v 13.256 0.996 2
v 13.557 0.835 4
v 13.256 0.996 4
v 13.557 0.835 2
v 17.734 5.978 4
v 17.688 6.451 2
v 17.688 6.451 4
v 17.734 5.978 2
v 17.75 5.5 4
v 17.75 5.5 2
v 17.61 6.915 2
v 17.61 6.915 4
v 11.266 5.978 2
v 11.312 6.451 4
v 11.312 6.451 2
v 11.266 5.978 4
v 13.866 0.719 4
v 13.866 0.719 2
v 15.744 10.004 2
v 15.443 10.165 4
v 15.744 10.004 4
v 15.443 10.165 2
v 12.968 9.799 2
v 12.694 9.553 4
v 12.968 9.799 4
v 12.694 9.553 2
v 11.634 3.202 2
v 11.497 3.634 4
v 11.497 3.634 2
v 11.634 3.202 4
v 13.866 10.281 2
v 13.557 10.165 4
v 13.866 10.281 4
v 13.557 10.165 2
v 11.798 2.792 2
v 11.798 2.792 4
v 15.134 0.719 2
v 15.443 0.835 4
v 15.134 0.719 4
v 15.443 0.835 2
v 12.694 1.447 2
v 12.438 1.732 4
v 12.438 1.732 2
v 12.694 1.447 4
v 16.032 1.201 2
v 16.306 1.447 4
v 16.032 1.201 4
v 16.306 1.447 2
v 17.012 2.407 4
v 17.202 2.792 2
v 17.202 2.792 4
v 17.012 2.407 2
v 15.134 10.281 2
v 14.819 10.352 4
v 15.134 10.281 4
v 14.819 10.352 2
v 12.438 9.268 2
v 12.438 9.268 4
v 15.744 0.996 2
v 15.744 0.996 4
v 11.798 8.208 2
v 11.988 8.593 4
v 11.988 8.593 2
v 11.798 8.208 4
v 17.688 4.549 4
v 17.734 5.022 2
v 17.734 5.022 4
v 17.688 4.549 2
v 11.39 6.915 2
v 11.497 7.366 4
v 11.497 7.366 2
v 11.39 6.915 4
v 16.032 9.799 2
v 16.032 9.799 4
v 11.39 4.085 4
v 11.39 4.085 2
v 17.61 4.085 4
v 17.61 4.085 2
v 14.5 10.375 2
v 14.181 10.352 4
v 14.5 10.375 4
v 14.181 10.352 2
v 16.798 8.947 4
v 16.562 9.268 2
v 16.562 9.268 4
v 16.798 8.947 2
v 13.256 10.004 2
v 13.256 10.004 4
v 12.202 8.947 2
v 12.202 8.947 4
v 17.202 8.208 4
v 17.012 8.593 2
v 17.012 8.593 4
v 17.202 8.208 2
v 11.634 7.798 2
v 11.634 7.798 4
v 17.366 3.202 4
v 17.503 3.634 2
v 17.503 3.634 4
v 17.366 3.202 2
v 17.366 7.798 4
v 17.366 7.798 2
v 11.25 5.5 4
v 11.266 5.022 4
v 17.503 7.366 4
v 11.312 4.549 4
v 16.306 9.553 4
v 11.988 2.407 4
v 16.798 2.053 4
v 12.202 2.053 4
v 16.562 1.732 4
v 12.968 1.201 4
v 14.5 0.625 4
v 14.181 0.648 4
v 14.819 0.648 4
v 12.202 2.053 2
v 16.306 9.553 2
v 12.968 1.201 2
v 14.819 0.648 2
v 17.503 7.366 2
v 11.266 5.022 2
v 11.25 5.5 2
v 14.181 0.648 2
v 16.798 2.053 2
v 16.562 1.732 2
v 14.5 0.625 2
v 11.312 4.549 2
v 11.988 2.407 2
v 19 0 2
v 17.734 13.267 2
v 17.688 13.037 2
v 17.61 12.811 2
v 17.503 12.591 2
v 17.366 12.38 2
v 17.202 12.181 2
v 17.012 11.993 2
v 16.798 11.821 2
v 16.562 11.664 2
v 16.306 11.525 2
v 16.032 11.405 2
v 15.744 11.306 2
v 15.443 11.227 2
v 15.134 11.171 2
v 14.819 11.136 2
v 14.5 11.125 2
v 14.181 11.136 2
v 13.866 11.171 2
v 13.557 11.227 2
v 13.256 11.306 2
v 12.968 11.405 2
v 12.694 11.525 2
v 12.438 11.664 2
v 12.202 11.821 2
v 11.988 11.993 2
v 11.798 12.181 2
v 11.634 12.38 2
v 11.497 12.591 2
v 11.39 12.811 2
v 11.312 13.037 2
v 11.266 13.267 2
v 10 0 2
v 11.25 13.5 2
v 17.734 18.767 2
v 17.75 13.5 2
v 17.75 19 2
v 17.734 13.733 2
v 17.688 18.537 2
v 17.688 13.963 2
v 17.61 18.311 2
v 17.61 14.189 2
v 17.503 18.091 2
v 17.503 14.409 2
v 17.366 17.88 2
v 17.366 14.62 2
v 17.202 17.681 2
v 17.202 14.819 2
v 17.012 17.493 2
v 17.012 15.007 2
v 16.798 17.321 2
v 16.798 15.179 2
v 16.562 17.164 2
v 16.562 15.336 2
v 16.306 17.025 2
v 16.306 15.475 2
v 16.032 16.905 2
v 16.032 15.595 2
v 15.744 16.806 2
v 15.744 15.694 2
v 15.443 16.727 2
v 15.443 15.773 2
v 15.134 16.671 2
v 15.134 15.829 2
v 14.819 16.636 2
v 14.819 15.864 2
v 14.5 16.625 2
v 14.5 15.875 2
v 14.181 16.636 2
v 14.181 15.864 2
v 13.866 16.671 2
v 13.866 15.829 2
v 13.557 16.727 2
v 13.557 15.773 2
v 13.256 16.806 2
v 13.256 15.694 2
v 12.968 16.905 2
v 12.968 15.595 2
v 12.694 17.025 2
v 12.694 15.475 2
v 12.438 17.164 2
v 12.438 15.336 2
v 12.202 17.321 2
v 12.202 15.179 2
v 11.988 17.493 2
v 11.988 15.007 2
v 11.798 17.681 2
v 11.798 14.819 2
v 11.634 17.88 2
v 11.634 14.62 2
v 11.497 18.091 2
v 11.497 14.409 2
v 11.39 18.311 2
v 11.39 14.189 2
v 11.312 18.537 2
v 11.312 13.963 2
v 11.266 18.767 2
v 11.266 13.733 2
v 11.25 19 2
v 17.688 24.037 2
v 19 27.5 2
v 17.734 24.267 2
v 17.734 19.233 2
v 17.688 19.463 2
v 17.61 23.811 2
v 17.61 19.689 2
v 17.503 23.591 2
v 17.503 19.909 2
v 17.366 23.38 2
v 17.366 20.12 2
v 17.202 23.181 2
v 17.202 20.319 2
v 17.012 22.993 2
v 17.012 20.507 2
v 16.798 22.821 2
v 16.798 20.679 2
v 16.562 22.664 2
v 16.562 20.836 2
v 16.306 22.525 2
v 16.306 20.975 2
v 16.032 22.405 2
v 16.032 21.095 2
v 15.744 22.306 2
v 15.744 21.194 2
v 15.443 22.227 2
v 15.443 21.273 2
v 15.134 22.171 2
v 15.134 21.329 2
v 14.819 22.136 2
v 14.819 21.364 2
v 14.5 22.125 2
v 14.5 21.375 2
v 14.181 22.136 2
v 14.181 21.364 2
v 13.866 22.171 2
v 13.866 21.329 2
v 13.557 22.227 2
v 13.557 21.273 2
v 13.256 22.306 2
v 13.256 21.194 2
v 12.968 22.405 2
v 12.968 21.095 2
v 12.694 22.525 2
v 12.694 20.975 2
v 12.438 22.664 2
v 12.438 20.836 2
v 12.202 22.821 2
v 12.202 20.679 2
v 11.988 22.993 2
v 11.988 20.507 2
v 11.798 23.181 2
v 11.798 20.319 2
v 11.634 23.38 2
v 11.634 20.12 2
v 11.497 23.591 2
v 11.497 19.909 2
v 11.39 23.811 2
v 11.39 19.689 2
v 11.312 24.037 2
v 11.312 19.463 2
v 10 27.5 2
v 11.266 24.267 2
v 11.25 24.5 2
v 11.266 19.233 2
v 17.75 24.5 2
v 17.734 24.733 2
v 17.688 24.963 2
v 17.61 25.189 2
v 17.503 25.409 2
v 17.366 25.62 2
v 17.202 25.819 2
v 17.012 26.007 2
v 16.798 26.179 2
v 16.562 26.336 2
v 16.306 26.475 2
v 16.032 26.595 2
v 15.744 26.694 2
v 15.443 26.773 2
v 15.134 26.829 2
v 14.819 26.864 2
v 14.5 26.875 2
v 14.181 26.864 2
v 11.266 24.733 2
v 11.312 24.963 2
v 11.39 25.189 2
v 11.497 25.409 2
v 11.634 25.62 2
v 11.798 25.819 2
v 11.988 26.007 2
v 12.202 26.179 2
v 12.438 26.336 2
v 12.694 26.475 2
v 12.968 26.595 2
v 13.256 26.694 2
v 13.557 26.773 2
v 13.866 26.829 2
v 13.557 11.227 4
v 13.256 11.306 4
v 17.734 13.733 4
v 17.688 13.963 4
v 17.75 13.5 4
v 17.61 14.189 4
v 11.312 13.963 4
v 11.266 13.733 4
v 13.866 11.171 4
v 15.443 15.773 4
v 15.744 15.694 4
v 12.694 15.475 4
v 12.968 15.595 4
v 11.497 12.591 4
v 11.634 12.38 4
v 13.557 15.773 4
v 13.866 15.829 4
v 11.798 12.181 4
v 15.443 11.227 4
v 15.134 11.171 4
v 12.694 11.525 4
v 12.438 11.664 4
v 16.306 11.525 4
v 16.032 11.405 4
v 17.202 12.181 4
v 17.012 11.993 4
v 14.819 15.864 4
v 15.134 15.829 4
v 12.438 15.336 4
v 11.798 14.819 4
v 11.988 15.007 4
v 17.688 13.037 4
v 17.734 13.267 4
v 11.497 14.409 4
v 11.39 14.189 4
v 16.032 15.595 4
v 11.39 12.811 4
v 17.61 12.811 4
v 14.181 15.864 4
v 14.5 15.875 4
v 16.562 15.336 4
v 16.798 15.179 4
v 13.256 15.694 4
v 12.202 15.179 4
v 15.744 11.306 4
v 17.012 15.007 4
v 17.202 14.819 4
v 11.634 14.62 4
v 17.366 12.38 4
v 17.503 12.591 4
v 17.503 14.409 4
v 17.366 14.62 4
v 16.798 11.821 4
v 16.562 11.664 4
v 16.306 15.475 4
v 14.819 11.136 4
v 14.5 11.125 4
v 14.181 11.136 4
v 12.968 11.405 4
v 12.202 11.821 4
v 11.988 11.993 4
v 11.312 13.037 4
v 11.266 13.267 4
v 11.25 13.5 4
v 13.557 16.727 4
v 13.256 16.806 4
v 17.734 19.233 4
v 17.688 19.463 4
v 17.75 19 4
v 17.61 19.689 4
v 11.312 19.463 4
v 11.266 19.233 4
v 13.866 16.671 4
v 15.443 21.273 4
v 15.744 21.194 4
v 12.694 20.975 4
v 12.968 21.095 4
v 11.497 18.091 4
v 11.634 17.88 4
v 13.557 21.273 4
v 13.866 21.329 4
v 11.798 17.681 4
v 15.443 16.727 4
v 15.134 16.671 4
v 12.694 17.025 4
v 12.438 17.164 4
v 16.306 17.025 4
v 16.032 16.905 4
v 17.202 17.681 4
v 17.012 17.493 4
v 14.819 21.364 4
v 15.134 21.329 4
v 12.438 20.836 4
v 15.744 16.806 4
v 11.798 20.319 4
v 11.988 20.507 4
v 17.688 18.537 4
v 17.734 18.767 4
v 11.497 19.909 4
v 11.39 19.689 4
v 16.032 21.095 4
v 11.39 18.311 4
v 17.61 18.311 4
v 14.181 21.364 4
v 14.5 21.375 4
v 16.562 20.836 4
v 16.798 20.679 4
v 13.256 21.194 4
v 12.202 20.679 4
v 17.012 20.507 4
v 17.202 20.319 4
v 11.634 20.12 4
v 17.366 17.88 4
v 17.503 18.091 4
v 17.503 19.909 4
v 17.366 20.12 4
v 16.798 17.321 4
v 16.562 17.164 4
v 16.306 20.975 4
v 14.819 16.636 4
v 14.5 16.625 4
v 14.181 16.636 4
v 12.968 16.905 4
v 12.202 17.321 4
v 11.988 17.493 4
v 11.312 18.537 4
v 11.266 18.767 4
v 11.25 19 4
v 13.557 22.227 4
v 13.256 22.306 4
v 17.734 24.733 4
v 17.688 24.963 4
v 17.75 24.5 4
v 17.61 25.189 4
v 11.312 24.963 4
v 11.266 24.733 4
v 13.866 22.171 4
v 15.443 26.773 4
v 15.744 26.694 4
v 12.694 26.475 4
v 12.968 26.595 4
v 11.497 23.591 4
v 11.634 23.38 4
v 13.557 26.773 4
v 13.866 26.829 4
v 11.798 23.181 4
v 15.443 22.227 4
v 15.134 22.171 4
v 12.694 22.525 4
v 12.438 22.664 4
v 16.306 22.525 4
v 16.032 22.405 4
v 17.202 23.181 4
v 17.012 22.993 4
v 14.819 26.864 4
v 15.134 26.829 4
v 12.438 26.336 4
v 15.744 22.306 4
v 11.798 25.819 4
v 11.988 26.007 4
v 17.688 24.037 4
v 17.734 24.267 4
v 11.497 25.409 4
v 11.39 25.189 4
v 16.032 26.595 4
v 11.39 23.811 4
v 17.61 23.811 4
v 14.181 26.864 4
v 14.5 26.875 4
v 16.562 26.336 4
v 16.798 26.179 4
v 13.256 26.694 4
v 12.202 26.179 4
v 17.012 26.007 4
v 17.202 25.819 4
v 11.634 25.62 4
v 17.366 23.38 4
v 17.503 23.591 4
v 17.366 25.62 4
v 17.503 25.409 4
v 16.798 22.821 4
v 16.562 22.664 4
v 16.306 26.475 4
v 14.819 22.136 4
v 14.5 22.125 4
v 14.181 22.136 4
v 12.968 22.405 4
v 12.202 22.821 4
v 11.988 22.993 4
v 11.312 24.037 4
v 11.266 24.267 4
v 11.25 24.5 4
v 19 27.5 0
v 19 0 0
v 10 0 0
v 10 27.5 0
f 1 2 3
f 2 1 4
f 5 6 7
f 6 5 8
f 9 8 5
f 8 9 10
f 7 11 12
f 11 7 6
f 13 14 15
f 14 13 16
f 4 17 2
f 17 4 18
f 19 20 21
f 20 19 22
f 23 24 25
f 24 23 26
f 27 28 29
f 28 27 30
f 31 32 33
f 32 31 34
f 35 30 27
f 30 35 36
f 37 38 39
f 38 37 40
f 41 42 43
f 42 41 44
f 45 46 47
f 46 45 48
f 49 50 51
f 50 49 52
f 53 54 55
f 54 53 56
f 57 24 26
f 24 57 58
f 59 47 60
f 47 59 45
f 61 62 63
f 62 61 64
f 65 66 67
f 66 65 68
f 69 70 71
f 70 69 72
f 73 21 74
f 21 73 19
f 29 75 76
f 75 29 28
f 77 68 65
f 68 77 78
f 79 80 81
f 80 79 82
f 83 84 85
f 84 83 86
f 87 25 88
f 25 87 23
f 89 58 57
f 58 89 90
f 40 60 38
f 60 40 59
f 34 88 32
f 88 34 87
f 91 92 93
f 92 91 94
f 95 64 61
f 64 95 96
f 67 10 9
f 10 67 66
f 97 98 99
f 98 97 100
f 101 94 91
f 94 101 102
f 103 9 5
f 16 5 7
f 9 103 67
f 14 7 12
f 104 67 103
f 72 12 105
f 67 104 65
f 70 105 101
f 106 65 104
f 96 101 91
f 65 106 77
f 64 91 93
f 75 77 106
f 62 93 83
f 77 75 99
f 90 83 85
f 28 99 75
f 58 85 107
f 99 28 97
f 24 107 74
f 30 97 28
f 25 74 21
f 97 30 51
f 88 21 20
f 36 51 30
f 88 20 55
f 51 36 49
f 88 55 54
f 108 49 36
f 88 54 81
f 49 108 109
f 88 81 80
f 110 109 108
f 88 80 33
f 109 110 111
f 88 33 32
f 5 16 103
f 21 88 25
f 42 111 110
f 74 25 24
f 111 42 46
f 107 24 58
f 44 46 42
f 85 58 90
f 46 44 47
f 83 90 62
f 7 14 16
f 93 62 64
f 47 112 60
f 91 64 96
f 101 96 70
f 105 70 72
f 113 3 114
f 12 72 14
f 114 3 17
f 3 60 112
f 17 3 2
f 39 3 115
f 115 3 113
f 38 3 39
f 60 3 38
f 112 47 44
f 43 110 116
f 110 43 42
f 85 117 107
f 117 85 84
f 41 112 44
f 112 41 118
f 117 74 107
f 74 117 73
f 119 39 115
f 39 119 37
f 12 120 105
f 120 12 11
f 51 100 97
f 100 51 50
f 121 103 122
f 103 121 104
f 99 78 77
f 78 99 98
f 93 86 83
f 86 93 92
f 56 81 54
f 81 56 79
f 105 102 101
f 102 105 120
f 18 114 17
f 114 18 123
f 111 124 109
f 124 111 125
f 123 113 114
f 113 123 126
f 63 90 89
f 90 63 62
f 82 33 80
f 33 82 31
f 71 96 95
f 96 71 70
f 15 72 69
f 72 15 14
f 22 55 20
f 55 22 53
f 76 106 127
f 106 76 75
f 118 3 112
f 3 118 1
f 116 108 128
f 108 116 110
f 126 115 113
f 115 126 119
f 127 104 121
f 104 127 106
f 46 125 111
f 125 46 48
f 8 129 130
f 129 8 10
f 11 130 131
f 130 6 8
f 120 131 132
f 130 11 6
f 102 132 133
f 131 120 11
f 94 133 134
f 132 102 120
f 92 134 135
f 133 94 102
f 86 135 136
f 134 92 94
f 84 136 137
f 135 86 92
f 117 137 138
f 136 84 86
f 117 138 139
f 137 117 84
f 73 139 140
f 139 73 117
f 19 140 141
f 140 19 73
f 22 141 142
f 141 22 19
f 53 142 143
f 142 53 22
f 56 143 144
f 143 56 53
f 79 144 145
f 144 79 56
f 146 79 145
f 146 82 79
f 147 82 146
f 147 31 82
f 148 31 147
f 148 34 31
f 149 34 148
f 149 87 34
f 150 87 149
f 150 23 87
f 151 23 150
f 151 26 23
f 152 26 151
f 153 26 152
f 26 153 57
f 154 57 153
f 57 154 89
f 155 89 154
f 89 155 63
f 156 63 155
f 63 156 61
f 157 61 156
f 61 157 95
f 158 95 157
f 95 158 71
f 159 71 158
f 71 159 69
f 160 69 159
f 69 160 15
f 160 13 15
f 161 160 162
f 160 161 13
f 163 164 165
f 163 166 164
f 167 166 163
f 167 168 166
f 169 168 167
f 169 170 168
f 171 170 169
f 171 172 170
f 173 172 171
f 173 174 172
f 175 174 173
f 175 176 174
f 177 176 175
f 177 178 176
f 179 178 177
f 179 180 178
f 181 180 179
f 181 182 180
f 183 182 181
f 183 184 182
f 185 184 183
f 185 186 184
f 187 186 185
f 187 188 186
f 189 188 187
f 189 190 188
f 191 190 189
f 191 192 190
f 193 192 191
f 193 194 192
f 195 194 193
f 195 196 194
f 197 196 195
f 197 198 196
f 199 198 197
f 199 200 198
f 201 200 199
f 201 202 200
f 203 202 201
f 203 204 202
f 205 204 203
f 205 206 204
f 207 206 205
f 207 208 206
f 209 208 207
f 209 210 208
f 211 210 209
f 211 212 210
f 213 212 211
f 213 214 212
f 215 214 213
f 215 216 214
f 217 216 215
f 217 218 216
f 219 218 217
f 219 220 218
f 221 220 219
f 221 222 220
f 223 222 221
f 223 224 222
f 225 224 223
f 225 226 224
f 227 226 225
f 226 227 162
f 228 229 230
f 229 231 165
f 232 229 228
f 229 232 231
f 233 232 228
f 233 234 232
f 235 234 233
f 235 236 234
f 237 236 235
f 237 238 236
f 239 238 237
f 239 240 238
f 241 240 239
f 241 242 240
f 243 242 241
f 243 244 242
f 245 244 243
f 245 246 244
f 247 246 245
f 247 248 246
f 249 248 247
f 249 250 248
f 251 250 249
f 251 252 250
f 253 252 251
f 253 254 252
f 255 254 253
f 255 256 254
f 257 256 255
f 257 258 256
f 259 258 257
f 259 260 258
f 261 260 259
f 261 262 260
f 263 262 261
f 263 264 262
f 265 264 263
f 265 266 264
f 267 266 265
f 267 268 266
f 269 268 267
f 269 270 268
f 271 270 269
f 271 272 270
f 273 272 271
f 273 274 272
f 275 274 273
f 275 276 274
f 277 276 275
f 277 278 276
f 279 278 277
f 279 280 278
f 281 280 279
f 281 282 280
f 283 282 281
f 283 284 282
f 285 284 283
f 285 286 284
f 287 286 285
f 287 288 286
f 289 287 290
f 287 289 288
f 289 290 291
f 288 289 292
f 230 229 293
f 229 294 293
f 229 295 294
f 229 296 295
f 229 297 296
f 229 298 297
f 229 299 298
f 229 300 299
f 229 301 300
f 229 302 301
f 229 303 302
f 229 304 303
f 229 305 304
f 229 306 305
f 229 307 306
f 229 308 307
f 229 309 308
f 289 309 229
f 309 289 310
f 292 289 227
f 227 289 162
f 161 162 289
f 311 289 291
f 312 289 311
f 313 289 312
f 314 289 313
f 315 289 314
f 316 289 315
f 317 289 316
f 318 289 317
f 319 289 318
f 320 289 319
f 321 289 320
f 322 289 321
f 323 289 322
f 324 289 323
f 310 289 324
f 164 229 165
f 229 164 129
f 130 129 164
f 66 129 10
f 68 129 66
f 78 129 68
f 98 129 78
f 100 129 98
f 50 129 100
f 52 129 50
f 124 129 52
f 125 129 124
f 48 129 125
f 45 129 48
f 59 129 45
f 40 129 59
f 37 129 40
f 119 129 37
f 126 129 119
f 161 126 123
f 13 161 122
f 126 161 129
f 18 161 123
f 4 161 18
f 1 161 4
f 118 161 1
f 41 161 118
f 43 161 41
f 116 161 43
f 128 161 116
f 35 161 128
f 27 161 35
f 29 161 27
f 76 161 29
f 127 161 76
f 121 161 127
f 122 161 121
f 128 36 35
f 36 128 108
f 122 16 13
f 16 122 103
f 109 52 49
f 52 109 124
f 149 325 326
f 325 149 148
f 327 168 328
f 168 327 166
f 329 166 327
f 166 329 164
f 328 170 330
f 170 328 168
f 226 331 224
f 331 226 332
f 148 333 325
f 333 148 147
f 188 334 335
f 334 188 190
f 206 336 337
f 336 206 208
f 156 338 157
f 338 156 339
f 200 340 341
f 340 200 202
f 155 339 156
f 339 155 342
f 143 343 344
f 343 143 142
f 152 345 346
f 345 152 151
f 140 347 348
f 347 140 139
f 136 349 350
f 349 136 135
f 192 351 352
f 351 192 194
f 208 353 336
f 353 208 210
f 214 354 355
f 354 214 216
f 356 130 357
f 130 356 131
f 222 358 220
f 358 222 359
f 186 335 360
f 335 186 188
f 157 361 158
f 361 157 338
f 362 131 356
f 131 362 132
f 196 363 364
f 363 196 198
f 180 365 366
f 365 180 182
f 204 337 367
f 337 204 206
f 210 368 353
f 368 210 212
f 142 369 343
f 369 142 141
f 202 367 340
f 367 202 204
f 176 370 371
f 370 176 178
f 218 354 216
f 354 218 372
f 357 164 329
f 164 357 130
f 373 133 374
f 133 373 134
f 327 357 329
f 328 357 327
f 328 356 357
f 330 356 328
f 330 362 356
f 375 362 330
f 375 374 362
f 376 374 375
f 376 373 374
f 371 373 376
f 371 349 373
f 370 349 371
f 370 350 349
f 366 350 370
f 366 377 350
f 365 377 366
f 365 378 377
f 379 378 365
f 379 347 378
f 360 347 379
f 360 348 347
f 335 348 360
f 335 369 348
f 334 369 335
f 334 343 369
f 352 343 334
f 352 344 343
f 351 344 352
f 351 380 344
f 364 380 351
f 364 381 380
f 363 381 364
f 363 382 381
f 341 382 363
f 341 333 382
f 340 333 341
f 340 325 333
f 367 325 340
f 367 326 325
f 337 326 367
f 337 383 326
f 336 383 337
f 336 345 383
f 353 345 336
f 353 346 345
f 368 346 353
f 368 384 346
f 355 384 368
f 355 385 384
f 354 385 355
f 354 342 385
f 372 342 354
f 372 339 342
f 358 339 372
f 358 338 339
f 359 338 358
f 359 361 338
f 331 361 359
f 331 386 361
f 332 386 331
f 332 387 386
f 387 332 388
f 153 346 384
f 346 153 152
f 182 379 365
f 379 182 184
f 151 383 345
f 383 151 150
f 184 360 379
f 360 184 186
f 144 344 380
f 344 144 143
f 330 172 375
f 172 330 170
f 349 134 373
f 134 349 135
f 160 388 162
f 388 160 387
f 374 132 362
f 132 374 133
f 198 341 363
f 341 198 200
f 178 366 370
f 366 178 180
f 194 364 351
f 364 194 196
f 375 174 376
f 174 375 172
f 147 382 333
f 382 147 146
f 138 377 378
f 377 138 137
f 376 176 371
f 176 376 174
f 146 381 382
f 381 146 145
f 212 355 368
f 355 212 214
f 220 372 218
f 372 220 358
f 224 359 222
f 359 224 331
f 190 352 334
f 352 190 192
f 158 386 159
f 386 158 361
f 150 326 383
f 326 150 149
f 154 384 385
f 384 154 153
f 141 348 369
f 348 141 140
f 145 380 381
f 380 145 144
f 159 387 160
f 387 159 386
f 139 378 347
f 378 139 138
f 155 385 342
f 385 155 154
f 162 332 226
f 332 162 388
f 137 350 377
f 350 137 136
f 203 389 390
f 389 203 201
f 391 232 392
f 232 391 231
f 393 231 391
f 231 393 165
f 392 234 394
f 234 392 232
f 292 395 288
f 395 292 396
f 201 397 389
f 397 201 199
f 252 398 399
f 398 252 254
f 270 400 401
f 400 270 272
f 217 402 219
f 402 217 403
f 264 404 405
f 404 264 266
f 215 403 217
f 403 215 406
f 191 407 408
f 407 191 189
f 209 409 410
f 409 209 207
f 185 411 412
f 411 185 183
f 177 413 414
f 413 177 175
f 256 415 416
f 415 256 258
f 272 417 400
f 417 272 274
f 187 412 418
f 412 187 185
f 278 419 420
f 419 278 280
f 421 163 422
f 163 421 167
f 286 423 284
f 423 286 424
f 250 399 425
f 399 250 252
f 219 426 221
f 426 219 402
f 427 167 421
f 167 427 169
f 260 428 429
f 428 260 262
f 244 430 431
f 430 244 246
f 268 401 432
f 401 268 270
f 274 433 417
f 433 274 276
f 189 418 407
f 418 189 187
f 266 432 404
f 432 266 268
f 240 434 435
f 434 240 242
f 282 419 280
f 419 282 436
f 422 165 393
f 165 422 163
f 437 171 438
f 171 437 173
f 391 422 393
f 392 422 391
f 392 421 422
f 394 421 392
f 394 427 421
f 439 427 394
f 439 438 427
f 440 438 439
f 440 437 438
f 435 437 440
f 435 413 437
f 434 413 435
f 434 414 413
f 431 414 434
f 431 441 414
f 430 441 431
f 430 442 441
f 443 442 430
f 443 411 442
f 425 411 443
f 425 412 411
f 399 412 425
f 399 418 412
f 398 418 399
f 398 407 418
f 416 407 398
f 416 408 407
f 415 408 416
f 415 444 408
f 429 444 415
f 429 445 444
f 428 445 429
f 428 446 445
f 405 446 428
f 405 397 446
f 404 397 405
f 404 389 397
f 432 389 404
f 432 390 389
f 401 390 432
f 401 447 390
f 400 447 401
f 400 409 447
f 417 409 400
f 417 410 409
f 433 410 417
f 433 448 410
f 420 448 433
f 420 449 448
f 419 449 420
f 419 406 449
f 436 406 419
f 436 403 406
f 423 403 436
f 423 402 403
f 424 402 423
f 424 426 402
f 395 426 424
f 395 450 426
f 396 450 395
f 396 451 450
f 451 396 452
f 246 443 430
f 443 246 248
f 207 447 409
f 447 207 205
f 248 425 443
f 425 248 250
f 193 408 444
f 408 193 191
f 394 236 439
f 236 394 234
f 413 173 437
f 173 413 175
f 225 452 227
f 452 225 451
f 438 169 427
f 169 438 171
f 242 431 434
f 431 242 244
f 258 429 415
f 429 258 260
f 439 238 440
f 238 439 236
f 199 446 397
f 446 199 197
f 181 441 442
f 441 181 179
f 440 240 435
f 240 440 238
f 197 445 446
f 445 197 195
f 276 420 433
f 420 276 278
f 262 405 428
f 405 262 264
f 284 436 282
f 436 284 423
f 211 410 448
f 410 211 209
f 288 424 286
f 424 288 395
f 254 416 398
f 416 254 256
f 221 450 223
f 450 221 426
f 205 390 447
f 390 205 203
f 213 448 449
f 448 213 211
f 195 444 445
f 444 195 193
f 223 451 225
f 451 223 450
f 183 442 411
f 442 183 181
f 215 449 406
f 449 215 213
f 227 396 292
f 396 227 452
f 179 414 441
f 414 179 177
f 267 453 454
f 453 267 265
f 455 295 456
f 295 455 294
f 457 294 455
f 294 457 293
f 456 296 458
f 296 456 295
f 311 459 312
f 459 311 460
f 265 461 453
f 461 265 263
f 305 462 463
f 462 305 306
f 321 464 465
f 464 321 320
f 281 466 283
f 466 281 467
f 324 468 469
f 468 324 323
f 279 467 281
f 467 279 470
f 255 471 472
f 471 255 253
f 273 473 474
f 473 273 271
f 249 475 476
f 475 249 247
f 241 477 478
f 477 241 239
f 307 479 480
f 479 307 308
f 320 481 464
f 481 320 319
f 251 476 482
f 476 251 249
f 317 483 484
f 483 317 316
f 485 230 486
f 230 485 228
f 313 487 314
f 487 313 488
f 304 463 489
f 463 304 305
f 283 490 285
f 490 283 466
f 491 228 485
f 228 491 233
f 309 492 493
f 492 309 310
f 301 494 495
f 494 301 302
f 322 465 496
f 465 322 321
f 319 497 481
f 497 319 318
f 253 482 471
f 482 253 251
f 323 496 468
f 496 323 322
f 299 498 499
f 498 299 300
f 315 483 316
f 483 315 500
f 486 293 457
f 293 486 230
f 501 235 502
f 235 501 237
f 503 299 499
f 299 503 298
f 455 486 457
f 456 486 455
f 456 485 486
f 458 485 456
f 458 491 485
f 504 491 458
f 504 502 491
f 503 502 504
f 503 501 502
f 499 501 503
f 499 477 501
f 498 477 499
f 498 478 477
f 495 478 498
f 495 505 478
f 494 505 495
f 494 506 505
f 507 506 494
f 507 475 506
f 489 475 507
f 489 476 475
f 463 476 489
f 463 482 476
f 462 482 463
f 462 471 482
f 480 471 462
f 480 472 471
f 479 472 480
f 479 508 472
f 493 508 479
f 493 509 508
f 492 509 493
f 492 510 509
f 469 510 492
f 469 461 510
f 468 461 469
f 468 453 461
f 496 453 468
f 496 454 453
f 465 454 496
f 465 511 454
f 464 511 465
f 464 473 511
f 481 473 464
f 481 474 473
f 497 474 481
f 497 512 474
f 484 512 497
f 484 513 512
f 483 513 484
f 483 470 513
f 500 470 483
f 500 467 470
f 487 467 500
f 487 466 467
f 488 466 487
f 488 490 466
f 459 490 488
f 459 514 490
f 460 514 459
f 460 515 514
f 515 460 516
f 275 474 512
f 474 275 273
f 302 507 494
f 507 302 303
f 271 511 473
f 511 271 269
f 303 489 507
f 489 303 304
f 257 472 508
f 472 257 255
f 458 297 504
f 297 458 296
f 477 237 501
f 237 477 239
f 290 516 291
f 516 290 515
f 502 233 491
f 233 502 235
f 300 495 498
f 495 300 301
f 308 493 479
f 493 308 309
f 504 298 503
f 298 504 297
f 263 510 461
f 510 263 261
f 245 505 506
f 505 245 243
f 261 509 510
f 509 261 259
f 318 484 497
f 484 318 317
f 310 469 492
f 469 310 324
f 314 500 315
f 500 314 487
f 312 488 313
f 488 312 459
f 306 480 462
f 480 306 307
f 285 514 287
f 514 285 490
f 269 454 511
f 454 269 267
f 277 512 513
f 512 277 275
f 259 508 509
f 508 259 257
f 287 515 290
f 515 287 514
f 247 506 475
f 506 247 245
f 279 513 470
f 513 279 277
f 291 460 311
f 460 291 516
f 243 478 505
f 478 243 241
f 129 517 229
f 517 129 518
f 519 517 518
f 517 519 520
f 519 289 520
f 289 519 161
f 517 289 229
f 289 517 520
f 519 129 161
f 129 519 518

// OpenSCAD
$fn = $preview ? 16 : 64;

thickness = 0.5;
wire_width = 7;
wire_thick_height = 10;
wire_thin_height = 5;
wire_length = 180;

module body() {
  difference() {
    cube([
      thickness + wire_width + thickness,
      thickness + wire_thick_height + thickness + (wire_thin_height + thickness) * 3,
      thickness + wire_length
    ]);
    translate([thickness, thickness, thickness]) cube([wire_width, wire_thick_height, wire_length]);
    translate([thickness, thickness + wire_thick_height + thickness, thickness])
      cube([wire_width, wire_thin_height, wire_length]);
    translate([thickness, thickness + wire_thick_height + thickness + wire_thin_height + thickness, thickness])
      cube([wire_width, wire_thin_height, wire_length]);
    translate([thickness, thickness + wire_thick_height + thickness + (wire_thin_height + thickness) * 2, thickness])
      cube([wire_width, wire_thin_height, wire_length]);
  }
}

module cap() {
  dowel = 2;
  catch = 1;
  allowance = 0.5;
  translate([catch / 2, 0, dowel]) {
    translate([thickness + wire_width / 2, thickness + wire_thick_height / 2, 0])
      scale([wire_width - allowance, wire_thick_height - allowance / 2])
      cylinder(d = 1, h = dowel);
    translate([thickness + wire_width / 2, thickness + wire_thick_height + thickness + wire_thin_height / 2, 0])
      scale([wire_width - allowance, wire_thin_height - allowance / 2])
      cylinder(d = 1, h = dowel);
    translate([thickness + wire_width / 2, thickness + wire_thick_height + thickness + wire_thin_height + thickness + wire_thin_height / 2, 0])
      scale([wire_width - allowance, wire_thin_height - allowance / 2])
      cylinder(d = 1, h = dowel);
    translate([thickness + wire_width / 2, thickness + wire_thick_height + thickness + (wire_thin_height + thickness) * 2 + wire_thin_height / 2, 0])
      scale([wire_width - allowance, wire_thin_height - allowance / 2])
      cylinder(d = 1, h = dowel);
  }
  cube([thickness + wire_width + thickness + catch, thickness + wire_thick_height + thickness + (wire_thin_height + thickness) * 3, dowel]);
}

// body();
translate([10, 0, 0]) cap();
